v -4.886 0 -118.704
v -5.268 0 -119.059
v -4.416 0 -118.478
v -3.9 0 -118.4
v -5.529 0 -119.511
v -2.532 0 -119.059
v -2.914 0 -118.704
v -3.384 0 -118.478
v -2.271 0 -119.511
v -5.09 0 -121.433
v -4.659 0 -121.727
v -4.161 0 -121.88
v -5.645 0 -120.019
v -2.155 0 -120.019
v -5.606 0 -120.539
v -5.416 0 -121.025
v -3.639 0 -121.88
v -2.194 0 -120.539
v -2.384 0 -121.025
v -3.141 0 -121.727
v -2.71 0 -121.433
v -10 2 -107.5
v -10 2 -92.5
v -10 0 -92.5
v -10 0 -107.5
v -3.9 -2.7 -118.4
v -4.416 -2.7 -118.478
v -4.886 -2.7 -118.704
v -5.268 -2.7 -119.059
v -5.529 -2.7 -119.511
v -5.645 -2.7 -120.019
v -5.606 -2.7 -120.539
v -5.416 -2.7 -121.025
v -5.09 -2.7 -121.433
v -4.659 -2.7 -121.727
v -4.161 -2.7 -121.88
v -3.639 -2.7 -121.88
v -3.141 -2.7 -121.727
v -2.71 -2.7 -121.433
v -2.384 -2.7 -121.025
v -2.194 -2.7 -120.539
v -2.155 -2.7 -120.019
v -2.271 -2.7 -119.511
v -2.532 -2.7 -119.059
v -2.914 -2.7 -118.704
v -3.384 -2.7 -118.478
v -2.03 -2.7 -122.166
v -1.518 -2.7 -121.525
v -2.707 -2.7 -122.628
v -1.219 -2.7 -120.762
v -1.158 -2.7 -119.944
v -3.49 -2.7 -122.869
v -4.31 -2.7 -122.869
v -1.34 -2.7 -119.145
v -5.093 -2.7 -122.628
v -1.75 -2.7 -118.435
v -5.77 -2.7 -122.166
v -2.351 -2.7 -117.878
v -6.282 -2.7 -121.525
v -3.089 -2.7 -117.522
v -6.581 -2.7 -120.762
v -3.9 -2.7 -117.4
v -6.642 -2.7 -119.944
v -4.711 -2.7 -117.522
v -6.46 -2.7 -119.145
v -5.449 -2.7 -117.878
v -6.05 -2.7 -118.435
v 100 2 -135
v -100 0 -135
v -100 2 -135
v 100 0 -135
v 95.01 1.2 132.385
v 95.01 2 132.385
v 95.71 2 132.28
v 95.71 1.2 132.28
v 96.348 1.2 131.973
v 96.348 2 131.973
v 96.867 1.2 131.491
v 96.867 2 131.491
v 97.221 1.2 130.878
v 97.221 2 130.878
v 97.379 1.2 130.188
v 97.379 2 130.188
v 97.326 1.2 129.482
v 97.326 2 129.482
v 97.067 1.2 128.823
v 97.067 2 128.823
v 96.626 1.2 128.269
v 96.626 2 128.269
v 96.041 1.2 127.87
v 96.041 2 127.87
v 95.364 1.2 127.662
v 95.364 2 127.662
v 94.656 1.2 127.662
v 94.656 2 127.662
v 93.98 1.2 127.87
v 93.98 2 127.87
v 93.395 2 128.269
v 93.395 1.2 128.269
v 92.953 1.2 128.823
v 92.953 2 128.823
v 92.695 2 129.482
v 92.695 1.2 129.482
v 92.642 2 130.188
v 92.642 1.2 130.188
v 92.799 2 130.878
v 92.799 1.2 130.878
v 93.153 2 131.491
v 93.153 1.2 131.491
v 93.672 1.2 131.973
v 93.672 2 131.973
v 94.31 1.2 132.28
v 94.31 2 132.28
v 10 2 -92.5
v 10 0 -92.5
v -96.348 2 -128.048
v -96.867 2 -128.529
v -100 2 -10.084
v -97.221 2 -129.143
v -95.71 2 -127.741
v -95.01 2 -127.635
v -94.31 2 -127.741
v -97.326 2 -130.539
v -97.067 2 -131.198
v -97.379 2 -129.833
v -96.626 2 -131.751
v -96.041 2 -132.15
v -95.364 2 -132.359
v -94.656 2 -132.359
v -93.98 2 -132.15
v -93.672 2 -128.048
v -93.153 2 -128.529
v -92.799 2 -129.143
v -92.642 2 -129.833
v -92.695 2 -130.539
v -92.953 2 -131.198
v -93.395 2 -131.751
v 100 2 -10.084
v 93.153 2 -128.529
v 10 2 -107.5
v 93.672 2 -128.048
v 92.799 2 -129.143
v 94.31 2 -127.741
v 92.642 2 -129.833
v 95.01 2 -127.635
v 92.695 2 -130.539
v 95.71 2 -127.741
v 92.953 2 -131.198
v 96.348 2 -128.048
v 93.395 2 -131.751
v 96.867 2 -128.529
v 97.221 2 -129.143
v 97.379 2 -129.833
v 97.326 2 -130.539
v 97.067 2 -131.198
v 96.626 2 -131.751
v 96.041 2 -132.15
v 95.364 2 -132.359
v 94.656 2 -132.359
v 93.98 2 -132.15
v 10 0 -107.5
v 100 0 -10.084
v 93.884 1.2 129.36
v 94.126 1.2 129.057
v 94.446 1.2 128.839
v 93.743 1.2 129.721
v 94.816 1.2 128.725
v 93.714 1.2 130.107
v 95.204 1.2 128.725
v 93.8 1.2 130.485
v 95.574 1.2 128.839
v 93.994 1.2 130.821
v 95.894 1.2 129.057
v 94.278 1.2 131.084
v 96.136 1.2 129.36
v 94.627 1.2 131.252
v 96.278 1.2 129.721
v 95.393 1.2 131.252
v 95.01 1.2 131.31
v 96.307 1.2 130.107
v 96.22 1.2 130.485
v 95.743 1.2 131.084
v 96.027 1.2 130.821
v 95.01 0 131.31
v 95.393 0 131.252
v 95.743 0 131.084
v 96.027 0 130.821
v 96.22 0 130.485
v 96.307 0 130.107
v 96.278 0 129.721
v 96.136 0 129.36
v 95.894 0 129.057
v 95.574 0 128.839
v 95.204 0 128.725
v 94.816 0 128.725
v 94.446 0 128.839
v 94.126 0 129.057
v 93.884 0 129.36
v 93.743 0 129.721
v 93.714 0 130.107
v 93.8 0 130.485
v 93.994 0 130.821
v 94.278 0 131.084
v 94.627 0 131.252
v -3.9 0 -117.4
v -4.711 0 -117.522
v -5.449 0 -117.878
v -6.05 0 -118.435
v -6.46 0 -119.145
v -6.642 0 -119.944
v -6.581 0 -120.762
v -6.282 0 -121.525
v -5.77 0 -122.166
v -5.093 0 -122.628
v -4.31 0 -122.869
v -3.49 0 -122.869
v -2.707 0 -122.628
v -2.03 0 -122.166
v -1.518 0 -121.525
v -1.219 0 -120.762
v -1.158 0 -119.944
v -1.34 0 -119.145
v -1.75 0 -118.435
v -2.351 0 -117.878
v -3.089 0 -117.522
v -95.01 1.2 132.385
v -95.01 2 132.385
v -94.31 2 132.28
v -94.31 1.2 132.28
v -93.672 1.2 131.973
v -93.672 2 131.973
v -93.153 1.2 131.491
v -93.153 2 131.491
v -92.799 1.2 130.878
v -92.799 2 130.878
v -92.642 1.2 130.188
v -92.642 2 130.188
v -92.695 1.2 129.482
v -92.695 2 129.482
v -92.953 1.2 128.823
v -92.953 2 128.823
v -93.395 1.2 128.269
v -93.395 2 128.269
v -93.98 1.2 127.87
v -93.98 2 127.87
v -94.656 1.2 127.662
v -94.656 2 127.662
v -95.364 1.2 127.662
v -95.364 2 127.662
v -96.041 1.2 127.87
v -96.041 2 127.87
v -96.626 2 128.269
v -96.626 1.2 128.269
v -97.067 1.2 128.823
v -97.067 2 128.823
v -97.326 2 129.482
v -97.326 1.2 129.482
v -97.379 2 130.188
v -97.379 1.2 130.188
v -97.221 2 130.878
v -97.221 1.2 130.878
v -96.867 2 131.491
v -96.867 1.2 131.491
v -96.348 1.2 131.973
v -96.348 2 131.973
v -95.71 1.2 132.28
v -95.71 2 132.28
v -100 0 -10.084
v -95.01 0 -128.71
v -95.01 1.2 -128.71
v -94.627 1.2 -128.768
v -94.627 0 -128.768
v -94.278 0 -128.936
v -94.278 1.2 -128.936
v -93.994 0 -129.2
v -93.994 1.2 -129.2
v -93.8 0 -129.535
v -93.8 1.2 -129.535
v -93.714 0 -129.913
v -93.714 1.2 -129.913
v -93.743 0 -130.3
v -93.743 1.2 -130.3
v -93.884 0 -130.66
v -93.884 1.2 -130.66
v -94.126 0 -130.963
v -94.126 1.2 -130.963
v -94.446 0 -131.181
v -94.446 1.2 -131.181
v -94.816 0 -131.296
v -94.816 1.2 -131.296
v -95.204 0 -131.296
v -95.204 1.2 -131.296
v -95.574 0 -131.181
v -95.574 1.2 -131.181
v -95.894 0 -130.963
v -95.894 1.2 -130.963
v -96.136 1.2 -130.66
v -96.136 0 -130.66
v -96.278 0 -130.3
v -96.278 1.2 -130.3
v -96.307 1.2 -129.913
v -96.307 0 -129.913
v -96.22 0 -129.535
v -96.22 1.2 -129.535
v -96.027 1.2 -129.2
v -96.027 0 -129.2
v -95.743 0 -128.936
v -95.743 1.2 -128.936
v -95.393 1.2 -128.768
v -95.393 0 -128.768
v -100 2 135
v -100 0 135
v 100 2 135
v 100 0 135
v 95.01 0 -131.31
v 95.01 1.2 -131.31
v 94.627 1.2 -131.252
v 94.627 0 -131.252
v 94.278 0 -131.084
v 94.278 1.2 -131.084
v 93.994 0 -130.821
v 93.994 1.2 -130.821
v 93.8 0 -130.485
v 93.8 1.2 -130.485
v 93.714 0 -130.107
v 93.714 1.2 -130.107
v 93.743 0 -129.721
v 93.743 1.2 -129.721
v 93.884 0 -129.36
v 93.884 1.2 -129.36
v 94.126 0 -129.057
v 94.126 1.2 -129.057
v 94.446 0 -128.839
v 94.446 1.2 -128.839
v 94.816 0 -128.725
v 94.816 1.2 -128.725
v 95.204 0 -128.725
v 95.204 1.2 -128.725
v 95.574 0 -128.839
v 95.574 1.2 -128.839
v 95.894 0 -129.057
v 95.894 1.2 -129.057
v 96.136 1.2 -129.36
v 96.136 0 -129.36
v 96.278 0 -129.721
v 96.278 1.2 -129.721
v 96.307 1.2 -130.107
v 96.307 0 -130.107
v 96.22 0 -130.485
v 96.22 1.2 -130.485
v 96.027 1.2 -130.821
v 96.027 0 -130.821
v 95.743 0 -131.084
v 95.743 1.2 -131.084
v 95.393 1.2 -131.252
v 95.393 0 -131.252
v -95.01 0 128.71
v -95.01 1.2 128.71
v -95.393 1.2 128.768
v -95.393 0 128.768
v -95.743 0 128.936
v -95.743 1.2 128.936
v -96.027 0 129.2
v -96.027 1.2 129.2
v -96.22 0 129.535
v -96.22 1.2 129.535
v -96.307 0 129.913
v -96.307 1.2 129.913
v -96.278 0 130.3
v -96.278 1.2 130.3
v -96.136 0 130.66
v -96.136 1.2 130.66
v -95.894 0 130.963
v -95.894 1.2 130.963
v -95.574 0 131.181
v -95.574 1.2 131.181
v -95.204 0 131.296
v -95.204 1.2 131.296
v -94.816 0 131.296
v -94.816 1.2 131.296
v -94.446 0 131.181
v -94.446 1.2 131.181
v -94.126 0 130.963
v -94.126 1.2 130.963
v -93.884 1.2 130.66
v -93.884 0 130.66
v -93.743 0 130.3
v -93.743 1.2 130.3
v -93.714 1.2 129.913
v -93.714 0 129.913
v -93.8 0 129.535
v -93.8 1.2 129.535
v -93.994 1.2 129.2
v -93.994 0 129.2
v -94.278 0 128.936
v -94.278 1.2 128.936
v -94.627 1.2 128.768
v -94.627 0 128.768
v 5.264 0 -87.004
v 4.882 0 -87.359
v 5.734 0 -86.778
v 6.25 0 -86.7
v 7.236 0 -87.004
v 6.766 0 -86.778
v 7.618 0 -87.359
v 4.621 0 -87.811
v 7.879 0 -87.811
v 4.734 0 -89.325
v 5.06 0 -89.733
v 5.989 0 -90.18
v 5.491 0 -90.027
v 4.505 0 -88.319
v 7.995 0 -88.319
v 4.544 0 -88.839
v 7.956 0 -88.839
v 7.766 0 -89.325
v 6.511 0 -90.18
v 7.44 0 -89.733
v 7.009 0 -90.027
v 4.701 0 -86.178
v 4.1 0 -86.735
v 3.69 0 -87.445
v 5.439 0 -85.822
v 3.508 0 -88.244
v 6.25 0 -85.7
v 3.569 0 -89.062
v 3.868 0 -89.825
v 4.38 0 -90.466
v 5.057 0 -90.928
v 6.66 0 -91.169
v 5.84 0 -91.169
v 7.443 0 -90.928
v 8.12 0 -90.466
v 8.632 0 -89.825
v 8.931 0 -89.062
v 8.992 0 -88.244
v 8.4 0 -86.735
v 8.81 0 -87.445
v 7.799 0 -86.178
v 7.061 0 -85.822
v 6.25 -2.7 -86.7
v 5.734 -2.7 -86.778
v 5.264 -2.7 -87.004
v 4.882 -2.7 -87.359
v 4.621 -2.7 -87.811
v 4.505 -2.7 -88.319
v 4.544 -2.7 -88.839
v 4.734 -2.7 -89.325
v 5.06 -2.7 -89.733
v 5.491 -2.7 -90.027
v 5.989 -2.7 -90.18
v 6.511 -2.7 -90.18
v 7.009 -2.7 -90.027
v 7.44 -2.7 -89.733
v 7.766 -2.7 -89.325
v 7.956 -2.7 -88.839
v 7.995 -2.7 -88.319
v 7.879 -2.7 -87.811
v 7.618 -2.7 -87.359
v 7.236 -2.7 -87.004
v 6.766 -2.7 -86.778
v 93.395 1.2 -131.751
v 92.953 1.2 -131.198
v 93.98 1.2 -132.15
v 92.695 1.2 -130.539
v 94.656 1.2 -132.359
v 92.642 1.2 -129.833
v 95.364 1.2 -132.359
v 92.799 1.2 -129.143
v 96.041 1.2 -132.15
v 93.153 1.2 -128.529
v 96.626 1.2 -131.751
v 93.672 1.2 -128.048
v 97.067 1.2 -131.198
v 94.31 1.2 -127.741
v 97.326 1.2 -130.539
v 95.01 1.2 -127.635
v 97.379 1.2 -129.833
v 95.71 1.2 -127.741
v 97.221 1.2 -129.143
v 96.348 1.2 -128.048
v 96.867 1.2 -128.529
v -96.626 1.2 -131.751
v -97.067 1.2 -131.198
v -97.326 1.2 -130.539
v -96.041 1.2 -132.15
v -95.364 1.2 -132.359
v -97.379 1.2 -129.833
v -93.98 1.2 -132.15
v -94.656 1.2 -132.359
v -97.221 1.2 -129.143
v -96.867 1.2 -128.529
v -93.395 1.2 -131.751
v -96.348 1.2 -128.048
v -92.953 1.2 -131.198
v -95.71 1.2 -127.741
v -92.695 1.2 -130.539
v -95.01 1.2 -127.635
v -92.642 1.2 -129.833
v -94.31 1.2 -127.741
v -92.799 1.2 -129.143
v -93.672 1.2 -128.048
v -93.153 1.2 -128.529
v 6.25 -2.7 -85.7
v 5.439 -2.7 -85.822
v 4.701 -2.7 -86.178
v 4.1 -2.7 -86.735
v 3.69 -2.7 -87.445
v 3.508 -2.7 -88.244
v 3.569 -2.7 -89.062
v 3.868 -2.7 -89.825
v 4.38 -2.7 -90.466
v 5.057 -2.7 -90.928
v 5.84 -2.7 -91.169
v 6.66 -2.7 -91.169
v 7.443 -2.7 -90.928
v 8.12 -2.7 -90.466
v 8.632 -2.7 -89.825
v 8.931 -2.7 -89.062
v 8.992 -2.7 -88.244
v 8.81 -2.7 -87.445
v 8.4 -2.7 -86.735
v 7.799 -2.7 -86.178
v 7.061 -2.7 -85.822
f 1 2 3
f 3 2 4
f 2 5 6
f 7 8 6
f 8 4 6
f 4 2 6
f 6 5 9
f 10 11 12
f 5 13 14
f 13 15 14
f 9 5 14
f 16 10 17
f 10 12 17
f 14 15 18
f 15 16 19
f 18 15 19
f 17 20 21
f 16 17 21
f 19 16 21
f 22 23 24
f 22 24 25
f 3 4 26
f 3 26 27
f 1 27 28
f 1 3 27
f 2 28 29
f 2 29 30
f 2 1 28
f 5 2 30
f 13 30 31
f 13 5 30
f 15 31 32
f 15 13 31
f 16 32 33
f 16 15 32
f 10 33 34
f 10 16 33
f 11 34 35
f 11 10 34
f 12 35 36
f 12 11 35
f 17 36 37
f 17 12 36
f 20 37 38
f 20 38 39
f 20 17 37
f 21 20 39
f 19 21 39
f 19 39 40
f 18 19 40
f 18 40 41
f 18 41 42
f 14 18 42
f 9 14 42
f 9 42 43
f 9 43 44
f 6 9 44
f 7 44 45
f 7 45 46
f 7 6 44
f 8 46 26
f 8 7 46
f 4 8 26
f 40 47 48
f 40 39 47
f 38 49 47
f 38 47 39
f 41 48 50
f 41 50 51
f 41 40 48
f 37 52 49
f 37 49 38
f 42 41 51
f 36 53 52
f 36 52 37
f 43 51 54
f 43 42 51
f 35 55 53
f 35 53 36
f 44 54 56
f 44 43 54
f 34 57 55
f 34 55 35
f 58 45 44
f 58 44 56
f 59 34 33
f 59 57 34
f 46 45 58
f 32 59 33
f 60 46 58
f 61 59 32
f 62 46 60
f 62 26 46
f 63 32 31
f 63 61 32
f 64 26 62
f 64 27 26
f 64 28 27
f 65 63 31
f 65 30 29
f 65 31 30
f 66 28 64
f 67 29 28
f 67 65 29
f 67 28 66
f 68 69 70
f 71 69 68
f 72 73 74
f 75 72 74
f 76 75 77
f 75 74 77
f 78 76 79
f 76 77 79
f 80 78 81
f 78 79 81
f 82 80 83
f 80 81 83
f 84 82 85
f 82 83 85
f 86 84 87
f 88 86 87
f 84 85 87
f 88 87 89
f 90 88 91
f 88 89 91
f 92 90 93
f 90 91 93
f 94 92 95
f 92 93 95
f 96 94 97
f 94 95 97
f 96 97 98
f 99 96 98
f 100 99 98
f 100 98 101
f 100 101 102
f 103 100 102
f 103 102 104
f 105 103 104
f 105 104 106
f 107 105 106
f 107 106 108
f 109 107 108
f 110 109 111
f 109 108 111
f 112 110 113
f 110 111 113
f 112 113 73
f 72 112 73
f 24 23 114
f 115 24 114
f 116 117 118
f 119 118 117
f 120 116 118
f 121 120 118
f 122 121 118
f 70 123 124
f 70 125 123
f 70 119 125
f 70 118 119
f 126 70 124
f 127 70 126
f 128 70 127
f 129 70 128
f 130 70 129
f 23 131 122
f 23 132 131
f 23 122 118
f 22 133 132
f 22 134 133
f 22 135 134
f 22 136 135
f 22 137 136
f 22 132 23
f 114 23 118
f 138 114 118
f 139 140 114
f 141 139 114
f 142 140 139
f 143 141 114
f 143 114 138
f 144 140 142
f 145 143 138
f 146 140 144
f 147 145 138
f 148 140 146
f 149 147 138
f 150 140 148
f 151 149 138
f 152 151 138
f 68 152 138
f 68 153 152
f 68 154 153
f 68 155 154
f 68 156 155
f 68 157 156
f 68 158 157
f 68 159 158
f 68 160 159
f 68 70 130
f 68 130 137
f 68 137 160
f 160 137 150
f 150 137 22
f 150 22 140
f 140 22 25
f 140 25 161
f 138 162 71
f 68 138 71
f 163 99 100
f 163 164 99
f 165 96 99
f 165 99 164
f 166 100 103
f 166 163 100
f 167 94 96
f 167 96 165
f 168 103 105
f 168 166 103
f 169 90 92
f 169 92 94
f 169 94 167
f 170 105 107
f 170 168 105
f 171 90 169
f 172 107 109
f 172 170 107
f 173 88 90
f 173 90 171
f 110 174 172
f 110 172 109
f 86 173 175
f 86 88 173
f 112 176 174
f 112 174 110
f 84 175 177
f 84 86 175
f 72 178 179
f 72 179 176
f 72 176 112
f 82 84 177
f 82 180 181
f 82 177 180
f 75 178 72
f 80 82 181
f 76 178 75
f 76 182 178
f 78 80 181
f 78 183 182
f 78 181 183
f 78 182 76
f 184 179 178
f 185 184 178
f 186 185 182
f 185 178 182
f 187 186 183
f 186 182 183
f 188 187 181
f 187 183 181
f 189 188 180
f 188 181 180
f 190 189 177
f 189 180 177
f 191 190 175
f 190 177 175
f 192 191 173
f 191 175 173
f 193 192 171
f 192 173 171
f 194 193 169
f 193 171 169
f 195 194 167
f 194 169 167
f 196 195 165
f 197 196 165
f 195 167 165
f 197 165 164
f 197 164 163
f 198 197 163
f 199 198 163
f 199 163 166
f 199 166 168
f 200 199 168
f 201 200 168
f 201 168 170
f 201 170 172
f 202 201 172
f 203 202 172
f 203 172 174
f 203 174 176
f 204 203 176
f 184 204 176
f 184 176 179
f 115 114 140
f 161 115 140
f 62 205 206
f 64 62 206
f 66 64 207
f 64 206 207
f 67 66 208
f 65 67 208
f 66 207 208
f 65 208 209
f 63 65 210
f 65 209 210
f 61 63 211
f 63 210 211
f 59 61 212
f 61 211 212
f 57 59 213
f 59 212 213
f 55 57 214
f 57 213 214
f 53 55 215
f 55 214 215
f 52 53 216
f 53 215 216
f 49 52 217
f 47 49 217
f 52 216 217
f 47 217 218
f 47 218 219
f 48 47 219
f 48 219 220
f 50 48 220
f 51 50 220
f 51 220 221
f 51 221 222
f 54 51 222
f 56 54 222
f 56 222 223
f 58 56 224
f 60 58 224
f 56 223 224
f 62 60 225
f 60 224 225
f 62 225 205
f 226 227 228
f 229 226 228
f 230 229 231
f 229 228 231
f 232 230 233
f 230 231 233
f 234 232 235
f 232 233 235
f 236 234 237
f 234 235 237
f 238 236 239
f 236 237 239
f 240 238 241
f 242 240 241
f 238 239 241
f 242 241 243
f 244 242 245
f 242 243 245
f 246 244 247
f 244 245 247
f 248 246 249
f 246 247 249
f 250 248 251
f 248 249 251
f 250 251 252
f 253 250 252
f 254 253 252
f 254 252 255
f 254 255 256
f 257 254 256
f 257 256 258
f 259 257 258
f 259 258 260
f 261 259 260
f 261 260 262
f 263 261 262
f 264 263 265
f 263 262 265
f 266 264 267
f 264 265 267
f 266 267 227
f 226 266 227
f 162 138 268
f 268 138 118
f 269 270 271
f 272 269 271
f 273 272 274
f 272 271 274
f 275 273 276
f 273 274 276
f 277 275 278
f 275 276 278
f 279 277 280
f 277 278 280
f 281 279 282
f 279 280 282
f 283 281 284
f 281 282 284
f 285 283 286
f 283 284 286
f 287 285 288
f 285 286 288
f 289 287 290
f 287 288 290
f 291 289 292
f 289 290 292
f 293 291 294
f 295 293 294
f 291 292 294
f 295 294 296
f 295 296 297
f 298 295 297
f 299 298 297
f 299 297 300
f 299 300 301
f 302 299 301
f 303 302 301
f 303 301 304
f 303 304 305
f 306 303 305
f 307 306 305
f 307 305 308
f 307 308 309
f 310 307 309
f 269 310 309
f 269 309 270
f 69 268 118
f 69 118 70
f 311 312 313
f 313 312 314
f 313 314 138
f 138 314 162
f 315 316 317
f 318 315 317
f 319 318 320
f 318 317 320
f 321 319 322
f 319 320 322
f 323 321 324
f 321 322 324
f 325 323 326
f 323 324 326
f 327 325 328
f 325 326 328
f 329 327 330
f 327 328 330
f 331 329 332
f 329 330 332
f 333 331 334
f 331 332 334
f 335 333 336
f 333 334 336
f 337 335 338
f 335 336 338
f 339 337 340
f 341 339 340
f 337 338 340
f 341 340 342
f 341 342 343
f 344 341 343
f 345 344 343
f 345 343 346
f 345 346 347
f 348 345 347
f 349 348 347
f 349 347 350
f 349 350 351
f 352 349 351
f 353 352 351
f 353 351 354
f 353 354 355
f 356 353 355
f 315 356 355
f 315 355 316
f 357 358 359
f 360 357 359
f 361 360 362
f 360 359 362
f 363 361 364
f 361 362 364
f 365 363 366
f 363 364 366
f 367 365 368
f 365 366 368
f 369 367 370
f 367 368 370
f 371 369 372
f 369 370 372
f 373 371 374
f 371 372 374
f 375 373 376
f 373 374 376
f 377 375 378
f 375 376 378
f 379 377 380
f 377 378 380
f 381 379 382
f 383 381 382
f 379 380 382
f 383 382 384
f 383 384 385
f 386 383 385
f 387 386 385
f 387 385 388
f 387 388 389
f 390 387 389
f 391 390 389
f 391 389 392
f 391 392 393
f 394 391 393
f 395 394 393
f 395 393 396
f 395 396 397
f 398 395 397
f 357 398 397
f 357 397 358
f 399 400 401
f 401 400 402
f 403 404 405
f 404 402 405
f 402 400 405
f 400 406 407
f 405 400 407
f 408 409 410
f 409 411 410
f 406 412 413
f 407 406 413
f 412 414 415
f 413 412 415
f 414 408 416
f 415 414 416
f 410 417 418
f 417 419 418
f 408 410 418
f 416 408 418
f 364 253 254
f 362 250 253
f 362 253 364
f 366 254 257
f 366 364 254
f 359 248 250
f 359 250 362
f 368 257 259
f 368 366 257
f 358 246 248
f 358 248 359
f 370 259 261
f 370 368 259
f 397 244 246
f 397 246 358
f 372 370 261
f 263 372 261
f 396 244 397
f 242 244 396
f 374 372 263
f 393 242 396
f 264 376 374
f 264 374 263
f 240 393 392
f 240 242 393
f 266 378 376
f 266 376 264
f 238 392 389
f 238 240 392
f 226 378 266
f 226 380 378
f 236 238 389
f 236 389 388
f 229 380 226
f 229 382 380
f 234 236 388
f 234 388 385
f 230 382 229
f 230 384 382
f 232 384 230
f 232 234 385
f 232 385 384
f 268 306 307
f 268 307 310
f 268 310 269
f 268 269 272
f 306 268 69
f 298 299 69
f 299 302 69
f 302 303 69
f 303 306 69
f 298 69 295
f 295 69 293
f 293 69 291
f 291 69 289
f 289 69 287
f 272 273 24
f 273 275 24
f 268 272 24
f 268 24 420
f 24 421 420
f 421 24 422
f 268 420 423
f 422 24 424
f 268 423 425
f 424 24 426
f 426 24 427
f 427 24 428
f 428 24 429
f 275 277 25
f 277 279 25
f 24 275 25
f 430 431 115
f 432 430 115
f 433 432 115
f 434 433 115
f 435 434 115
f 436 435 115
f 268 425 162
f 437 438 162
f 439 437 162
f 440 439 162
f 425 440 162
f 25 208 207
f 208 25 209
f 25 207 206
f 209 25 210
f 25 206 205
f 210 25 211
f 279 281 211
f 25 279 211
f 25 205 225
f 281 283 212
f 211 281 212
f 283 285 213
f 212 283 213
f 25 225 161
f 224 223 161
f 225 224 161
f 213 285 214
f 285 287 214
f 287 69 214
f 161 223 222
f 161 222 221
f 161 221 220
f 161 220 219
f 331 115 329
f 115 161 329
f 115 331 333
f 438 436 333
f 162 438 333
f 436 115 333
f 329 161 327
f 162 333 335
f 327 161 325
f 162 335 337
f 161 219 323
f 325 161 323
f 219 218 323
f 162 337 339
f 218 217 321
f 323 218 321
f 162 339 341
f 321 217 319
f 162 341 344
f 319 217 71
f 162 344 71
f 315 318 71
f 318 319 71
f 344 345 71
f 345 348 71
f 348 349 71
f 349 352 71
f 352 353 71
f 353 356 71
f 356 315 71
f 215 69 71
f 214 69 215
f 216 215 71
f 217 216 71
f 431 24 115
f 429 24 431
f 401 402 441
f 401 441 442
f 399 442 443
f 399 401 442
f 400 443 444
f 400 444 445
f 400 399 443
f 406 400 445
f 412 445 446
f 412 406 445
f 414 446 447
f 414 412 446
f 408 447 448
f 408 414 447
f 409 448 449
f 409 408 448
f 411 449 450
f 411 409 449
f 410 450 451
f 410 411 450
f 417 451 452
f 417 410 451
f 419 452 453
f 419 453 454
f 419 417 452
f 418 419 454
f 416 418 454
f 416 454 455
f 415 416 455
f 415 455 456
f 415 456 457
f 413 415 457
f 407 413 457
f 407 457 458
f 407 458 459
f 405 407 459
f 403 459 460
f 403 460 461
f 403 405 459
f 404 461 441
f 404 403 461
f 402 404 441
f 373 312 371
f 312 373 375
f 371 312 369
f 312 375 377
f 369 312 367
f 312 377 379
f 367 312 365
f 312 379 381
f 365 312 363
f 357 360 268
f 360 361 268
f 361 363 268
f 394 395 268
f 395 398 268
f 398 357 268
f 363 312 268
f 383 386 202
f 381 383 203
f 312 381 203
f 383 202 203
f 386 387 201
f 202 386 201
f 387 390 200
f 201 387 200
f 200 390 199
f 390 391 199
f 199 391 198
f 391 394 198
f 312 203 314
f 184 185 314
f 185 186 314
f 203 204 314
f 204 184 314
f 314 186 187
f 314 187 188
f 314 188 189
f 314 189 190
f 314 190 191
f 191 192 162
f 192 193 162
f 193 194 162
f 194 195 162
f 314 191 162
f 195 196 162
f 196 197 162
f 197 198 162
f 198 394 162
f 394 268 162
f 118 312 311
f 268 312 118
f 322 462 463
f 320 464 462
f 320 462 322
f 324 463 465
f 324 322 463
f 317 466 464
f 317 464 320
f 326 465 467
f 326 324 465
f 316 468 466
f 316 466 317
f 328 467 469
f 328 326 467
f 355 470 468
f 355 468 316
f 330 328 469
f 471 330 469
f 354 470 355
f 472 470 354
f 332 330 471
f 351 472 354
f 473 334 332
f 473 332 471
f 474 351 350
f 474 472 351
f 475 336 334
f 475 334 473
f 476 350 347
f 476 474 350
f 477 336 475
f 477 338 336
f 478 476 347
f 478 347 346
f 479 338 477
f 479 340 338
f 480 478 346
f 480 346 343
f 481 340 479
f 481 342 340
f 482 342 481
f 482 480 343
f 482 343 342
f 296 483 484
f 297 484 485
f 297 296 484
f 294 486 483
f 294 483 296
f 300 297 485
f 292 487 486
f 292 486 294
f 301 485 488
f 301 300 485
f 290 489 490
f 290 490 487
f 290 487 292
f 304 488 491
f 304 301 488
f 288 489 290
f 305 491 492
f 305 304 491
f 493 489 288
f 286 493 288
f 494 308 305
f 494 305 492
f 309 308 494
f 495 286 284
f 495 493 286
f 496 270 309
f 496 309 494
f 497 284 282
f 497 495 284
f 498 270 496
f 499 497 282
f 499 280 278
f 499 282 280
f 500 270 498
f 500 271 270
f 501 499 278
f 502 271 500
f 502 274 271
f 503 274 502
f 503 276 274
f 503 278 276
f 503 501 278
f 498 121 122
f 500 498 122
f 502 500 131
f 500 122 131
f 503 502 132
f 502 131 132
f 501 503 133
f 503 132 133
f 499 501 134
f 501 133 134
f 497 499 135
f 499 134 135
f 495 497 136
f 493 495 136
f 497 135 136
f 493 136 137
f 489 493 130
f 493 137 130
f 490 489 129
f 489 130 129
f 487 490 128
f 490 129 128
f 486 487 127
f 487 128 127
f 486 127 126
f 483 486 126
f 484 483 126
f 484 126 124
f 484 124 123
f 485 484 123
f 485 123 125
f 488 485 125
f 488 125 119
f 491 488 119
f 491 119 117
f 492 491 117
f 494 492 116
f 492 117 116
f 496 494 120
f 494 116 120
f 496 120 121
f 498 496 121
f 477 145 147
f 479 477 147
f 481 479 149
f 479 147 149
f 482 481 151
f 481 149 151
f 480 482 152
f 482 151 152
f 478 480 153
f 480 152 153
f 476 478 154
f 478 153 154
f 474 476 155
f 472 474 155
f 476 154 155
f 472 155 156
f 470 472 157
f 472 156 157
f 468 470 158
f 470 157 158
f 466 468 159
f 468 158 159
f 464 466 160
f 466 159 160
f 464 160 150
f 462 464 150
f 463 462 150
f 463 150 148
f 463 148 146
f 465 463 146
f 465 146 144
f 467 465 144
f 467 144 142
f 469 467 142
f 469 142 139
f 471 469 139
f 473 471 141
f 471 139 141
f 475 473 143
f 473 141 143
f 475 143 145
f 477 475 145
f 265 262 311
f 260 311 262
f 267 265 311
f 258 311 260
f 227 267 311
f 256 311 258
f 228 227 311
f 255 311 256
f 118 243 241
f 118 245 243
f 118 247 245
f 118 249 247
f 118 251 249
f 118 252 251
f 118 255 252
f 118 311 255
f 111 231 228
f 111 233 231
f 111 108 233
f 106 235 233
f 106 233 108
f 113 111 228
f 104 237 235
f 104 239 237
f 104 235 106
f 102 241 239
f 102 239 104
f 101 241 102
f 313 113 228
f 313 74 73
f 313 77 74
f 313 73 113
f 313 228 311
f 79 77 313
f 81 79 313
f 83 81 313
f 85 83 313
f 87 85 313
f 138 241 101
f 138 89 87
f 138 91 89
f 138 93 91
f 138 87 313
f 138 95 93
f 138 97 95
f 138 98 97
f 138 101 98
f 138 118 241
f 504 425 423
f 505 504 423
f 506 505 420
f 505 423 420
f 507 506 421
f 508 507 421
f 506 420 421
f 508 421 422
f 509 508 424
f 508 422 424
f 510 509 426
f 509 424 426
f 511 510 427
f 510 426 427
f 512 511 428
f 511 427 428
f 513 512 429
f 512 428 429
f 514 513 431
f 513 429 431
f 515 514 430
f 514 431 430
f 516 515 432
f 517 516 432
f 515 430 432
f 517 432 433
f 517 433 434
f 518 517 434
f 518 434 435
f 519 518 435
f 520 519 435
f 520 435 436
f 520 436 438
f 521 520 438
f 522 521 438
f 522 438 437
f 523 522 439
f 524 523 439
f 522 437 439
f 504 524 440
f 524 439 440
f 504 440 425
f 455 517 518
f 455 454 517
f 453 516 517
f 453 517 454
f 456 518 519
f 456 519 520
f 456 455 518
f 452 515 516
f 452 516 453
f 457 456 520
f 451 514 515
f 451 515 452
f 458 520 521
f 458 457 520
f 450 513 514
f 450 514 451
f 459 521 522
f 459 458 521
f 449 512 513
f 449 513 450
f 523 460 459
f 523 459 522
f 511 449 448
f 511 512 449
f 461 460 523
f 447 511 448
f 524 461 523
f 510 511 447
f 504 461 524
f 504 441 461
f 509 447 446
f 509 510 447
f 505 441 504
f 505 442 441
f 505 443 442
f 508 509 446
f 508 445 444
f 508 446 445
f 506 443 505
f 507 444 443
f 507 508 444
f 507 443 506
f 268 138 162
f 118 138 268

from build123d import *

# Parameters (mm, degrees)
SKETCH_1_W          = 200
SKETCH_1_H          = 270
EXTRUDE_1_DEPTH     = 2
SKETCH_2_R          = 1.3
CUT_EXTRUDE_1_DEPTH = 169.014880293
SKETCH_3_R          = 2.375
CUT_EXTRUDE_2_DEPTH = 0.8
SKETCH_4_W          = 20
SKETCH_4_H          = 15
CUT_EXTRUDE_3_DEPTH = 169.014880293
SKETCH_5_R          = 2.75
SKETCH_5_R_2        = 1.75
EXTRUDE_2_DEPTH     = 2.7


with BuildPart() as part:
    # Эскиз1 → Бобышка-Вытянуть1 (new body)
    with BuildSketch(Plane(origin=(0, 0, 0), x_dir=(1, 0, 0), z_dir=(0, 1, 0))):
        Rectangle(SKETCH_1_W, SKETCH_1_H)
    extrude(amount=EXTRUDE_1_DEPTH)

    # Эскиз2 → Вырез-Вытянуть1 (cut, through all)
    with BuildSketch(Plane(origin=(0, 2, 0), x_dir=(1, 0, 0), z_dir=(0, 1, 0))):
        with Locations(Location((-95.01023, 130.01023, 0), (0, 0, 270))):
            Circle(SKETCH_2_R)
        with Locations(Location((95.01023, 130.01023, 0), (0, 0, 90))):
            Circle(SKETCH_2_R)
        with Locations(Location((95.01023, -130.01023, 0), (0, 0, 270))):
            Circle(SKETCH_2_R)
        with Locations(Location((-95.01023, -130.01023, 0), (0, 0, 90))):
            Circle(SKETCH_2_R)
    extrude(amount=-CUT_EXTRUDE_1_DEPTH, mode=Mode.SUBTRACT)

    # Эскиз3 → Вырез-Вытянуть2 (cut)
    with BuildSketch(Plane(origin=(0, 2, 0), x_dir=(1, 0, 0), z_dir=(0, 1, 0))):
        with Locations(Location((-95.01023, 130.01023, 0), (0, 0, 270))):
            Circle(SKETCH_3_R)
        with Locations(Location((95.01023, 130.01023, 0), (0, 0, 270))):
            Circle(SKETCH_3_R)
        with Locations(Location((-95.01023, -130.01023, 0), (0, 0, 270))):
            Circle(SKETCH_3_R)
        with Locations(Location((95.01023, -130.01023, 0), (0, 0, 270))):
            Circle(SKETCH_3_R)
    extrude(amount=-CUT_EXTRUDE_2_DEPTH, mode=Mode.SUBTRACT)

    # Эскиз4 → Вырез-Вытянуть3 (cut, through all)
    with BuildSketch(Plane(origin=(0, 2, 0), x_dir=(1, 0, 0), z_dir=(0, 1, 0))):
        with Locations((0, 100)):
            Rectangle(SKETCH_4_W, SKETCH_4_H)
    extrude(amount=-CUT_EXTRUDE_3_DEPTH, mode=Mode.SUBTRACT)

    # Эскиз5 → Бобышка-Вытянуть2 (add)
    # profile 1 of 2: a face of its own
    with BuildSketch(Plane.XZ):
        with Locations(Location((-3.9, -120.15, 0), (0, 0, 90))):
            Circle(SKETCH_5_R)
        with Locations(Location((-3.9, -120.15, 0), (0, 0, 90))):
            Circle(SKETCH_5_R_2, mode=Mode.SUBTRACT)
    # profile 2 of 2: a face of its own
    with BuildSketch(Plane.XZ):
        with Locations(Location((6.25, -88.45, 0), (0, 0, 90))):
            Circle(SKETCH_5_R)
        with Locations(Location((6.25, -88.45, 0), (0, 0, 90))):
            Circle(SKETCH_5_R_2, mode=Mode.SUBTRACT)
    extrude(amount=EXTRUDE_2_DEPTH)


with BuildPart() as body_2:
    # Split Bodies 1: the piece on the far side of the plane
    add(part.part)
    split(bisect_by=Plane(origin=(0, 0, -10.0835), x_dir=(-1, 0, 0), z_dir=(0, 0, -1)), keep=Keep.BOTTOM)


with BuildPart() as part_1:
    add(part.part)

    # Split Bodies 1
    split(bisect_by=Plane(origin=(0, 0, -10.0835), x_dir=(-1, 0, 0), z_dir=(0, 0, -1)), keep=Keep.TOP)


solid = Compound([body_2.part, part_1.part])
